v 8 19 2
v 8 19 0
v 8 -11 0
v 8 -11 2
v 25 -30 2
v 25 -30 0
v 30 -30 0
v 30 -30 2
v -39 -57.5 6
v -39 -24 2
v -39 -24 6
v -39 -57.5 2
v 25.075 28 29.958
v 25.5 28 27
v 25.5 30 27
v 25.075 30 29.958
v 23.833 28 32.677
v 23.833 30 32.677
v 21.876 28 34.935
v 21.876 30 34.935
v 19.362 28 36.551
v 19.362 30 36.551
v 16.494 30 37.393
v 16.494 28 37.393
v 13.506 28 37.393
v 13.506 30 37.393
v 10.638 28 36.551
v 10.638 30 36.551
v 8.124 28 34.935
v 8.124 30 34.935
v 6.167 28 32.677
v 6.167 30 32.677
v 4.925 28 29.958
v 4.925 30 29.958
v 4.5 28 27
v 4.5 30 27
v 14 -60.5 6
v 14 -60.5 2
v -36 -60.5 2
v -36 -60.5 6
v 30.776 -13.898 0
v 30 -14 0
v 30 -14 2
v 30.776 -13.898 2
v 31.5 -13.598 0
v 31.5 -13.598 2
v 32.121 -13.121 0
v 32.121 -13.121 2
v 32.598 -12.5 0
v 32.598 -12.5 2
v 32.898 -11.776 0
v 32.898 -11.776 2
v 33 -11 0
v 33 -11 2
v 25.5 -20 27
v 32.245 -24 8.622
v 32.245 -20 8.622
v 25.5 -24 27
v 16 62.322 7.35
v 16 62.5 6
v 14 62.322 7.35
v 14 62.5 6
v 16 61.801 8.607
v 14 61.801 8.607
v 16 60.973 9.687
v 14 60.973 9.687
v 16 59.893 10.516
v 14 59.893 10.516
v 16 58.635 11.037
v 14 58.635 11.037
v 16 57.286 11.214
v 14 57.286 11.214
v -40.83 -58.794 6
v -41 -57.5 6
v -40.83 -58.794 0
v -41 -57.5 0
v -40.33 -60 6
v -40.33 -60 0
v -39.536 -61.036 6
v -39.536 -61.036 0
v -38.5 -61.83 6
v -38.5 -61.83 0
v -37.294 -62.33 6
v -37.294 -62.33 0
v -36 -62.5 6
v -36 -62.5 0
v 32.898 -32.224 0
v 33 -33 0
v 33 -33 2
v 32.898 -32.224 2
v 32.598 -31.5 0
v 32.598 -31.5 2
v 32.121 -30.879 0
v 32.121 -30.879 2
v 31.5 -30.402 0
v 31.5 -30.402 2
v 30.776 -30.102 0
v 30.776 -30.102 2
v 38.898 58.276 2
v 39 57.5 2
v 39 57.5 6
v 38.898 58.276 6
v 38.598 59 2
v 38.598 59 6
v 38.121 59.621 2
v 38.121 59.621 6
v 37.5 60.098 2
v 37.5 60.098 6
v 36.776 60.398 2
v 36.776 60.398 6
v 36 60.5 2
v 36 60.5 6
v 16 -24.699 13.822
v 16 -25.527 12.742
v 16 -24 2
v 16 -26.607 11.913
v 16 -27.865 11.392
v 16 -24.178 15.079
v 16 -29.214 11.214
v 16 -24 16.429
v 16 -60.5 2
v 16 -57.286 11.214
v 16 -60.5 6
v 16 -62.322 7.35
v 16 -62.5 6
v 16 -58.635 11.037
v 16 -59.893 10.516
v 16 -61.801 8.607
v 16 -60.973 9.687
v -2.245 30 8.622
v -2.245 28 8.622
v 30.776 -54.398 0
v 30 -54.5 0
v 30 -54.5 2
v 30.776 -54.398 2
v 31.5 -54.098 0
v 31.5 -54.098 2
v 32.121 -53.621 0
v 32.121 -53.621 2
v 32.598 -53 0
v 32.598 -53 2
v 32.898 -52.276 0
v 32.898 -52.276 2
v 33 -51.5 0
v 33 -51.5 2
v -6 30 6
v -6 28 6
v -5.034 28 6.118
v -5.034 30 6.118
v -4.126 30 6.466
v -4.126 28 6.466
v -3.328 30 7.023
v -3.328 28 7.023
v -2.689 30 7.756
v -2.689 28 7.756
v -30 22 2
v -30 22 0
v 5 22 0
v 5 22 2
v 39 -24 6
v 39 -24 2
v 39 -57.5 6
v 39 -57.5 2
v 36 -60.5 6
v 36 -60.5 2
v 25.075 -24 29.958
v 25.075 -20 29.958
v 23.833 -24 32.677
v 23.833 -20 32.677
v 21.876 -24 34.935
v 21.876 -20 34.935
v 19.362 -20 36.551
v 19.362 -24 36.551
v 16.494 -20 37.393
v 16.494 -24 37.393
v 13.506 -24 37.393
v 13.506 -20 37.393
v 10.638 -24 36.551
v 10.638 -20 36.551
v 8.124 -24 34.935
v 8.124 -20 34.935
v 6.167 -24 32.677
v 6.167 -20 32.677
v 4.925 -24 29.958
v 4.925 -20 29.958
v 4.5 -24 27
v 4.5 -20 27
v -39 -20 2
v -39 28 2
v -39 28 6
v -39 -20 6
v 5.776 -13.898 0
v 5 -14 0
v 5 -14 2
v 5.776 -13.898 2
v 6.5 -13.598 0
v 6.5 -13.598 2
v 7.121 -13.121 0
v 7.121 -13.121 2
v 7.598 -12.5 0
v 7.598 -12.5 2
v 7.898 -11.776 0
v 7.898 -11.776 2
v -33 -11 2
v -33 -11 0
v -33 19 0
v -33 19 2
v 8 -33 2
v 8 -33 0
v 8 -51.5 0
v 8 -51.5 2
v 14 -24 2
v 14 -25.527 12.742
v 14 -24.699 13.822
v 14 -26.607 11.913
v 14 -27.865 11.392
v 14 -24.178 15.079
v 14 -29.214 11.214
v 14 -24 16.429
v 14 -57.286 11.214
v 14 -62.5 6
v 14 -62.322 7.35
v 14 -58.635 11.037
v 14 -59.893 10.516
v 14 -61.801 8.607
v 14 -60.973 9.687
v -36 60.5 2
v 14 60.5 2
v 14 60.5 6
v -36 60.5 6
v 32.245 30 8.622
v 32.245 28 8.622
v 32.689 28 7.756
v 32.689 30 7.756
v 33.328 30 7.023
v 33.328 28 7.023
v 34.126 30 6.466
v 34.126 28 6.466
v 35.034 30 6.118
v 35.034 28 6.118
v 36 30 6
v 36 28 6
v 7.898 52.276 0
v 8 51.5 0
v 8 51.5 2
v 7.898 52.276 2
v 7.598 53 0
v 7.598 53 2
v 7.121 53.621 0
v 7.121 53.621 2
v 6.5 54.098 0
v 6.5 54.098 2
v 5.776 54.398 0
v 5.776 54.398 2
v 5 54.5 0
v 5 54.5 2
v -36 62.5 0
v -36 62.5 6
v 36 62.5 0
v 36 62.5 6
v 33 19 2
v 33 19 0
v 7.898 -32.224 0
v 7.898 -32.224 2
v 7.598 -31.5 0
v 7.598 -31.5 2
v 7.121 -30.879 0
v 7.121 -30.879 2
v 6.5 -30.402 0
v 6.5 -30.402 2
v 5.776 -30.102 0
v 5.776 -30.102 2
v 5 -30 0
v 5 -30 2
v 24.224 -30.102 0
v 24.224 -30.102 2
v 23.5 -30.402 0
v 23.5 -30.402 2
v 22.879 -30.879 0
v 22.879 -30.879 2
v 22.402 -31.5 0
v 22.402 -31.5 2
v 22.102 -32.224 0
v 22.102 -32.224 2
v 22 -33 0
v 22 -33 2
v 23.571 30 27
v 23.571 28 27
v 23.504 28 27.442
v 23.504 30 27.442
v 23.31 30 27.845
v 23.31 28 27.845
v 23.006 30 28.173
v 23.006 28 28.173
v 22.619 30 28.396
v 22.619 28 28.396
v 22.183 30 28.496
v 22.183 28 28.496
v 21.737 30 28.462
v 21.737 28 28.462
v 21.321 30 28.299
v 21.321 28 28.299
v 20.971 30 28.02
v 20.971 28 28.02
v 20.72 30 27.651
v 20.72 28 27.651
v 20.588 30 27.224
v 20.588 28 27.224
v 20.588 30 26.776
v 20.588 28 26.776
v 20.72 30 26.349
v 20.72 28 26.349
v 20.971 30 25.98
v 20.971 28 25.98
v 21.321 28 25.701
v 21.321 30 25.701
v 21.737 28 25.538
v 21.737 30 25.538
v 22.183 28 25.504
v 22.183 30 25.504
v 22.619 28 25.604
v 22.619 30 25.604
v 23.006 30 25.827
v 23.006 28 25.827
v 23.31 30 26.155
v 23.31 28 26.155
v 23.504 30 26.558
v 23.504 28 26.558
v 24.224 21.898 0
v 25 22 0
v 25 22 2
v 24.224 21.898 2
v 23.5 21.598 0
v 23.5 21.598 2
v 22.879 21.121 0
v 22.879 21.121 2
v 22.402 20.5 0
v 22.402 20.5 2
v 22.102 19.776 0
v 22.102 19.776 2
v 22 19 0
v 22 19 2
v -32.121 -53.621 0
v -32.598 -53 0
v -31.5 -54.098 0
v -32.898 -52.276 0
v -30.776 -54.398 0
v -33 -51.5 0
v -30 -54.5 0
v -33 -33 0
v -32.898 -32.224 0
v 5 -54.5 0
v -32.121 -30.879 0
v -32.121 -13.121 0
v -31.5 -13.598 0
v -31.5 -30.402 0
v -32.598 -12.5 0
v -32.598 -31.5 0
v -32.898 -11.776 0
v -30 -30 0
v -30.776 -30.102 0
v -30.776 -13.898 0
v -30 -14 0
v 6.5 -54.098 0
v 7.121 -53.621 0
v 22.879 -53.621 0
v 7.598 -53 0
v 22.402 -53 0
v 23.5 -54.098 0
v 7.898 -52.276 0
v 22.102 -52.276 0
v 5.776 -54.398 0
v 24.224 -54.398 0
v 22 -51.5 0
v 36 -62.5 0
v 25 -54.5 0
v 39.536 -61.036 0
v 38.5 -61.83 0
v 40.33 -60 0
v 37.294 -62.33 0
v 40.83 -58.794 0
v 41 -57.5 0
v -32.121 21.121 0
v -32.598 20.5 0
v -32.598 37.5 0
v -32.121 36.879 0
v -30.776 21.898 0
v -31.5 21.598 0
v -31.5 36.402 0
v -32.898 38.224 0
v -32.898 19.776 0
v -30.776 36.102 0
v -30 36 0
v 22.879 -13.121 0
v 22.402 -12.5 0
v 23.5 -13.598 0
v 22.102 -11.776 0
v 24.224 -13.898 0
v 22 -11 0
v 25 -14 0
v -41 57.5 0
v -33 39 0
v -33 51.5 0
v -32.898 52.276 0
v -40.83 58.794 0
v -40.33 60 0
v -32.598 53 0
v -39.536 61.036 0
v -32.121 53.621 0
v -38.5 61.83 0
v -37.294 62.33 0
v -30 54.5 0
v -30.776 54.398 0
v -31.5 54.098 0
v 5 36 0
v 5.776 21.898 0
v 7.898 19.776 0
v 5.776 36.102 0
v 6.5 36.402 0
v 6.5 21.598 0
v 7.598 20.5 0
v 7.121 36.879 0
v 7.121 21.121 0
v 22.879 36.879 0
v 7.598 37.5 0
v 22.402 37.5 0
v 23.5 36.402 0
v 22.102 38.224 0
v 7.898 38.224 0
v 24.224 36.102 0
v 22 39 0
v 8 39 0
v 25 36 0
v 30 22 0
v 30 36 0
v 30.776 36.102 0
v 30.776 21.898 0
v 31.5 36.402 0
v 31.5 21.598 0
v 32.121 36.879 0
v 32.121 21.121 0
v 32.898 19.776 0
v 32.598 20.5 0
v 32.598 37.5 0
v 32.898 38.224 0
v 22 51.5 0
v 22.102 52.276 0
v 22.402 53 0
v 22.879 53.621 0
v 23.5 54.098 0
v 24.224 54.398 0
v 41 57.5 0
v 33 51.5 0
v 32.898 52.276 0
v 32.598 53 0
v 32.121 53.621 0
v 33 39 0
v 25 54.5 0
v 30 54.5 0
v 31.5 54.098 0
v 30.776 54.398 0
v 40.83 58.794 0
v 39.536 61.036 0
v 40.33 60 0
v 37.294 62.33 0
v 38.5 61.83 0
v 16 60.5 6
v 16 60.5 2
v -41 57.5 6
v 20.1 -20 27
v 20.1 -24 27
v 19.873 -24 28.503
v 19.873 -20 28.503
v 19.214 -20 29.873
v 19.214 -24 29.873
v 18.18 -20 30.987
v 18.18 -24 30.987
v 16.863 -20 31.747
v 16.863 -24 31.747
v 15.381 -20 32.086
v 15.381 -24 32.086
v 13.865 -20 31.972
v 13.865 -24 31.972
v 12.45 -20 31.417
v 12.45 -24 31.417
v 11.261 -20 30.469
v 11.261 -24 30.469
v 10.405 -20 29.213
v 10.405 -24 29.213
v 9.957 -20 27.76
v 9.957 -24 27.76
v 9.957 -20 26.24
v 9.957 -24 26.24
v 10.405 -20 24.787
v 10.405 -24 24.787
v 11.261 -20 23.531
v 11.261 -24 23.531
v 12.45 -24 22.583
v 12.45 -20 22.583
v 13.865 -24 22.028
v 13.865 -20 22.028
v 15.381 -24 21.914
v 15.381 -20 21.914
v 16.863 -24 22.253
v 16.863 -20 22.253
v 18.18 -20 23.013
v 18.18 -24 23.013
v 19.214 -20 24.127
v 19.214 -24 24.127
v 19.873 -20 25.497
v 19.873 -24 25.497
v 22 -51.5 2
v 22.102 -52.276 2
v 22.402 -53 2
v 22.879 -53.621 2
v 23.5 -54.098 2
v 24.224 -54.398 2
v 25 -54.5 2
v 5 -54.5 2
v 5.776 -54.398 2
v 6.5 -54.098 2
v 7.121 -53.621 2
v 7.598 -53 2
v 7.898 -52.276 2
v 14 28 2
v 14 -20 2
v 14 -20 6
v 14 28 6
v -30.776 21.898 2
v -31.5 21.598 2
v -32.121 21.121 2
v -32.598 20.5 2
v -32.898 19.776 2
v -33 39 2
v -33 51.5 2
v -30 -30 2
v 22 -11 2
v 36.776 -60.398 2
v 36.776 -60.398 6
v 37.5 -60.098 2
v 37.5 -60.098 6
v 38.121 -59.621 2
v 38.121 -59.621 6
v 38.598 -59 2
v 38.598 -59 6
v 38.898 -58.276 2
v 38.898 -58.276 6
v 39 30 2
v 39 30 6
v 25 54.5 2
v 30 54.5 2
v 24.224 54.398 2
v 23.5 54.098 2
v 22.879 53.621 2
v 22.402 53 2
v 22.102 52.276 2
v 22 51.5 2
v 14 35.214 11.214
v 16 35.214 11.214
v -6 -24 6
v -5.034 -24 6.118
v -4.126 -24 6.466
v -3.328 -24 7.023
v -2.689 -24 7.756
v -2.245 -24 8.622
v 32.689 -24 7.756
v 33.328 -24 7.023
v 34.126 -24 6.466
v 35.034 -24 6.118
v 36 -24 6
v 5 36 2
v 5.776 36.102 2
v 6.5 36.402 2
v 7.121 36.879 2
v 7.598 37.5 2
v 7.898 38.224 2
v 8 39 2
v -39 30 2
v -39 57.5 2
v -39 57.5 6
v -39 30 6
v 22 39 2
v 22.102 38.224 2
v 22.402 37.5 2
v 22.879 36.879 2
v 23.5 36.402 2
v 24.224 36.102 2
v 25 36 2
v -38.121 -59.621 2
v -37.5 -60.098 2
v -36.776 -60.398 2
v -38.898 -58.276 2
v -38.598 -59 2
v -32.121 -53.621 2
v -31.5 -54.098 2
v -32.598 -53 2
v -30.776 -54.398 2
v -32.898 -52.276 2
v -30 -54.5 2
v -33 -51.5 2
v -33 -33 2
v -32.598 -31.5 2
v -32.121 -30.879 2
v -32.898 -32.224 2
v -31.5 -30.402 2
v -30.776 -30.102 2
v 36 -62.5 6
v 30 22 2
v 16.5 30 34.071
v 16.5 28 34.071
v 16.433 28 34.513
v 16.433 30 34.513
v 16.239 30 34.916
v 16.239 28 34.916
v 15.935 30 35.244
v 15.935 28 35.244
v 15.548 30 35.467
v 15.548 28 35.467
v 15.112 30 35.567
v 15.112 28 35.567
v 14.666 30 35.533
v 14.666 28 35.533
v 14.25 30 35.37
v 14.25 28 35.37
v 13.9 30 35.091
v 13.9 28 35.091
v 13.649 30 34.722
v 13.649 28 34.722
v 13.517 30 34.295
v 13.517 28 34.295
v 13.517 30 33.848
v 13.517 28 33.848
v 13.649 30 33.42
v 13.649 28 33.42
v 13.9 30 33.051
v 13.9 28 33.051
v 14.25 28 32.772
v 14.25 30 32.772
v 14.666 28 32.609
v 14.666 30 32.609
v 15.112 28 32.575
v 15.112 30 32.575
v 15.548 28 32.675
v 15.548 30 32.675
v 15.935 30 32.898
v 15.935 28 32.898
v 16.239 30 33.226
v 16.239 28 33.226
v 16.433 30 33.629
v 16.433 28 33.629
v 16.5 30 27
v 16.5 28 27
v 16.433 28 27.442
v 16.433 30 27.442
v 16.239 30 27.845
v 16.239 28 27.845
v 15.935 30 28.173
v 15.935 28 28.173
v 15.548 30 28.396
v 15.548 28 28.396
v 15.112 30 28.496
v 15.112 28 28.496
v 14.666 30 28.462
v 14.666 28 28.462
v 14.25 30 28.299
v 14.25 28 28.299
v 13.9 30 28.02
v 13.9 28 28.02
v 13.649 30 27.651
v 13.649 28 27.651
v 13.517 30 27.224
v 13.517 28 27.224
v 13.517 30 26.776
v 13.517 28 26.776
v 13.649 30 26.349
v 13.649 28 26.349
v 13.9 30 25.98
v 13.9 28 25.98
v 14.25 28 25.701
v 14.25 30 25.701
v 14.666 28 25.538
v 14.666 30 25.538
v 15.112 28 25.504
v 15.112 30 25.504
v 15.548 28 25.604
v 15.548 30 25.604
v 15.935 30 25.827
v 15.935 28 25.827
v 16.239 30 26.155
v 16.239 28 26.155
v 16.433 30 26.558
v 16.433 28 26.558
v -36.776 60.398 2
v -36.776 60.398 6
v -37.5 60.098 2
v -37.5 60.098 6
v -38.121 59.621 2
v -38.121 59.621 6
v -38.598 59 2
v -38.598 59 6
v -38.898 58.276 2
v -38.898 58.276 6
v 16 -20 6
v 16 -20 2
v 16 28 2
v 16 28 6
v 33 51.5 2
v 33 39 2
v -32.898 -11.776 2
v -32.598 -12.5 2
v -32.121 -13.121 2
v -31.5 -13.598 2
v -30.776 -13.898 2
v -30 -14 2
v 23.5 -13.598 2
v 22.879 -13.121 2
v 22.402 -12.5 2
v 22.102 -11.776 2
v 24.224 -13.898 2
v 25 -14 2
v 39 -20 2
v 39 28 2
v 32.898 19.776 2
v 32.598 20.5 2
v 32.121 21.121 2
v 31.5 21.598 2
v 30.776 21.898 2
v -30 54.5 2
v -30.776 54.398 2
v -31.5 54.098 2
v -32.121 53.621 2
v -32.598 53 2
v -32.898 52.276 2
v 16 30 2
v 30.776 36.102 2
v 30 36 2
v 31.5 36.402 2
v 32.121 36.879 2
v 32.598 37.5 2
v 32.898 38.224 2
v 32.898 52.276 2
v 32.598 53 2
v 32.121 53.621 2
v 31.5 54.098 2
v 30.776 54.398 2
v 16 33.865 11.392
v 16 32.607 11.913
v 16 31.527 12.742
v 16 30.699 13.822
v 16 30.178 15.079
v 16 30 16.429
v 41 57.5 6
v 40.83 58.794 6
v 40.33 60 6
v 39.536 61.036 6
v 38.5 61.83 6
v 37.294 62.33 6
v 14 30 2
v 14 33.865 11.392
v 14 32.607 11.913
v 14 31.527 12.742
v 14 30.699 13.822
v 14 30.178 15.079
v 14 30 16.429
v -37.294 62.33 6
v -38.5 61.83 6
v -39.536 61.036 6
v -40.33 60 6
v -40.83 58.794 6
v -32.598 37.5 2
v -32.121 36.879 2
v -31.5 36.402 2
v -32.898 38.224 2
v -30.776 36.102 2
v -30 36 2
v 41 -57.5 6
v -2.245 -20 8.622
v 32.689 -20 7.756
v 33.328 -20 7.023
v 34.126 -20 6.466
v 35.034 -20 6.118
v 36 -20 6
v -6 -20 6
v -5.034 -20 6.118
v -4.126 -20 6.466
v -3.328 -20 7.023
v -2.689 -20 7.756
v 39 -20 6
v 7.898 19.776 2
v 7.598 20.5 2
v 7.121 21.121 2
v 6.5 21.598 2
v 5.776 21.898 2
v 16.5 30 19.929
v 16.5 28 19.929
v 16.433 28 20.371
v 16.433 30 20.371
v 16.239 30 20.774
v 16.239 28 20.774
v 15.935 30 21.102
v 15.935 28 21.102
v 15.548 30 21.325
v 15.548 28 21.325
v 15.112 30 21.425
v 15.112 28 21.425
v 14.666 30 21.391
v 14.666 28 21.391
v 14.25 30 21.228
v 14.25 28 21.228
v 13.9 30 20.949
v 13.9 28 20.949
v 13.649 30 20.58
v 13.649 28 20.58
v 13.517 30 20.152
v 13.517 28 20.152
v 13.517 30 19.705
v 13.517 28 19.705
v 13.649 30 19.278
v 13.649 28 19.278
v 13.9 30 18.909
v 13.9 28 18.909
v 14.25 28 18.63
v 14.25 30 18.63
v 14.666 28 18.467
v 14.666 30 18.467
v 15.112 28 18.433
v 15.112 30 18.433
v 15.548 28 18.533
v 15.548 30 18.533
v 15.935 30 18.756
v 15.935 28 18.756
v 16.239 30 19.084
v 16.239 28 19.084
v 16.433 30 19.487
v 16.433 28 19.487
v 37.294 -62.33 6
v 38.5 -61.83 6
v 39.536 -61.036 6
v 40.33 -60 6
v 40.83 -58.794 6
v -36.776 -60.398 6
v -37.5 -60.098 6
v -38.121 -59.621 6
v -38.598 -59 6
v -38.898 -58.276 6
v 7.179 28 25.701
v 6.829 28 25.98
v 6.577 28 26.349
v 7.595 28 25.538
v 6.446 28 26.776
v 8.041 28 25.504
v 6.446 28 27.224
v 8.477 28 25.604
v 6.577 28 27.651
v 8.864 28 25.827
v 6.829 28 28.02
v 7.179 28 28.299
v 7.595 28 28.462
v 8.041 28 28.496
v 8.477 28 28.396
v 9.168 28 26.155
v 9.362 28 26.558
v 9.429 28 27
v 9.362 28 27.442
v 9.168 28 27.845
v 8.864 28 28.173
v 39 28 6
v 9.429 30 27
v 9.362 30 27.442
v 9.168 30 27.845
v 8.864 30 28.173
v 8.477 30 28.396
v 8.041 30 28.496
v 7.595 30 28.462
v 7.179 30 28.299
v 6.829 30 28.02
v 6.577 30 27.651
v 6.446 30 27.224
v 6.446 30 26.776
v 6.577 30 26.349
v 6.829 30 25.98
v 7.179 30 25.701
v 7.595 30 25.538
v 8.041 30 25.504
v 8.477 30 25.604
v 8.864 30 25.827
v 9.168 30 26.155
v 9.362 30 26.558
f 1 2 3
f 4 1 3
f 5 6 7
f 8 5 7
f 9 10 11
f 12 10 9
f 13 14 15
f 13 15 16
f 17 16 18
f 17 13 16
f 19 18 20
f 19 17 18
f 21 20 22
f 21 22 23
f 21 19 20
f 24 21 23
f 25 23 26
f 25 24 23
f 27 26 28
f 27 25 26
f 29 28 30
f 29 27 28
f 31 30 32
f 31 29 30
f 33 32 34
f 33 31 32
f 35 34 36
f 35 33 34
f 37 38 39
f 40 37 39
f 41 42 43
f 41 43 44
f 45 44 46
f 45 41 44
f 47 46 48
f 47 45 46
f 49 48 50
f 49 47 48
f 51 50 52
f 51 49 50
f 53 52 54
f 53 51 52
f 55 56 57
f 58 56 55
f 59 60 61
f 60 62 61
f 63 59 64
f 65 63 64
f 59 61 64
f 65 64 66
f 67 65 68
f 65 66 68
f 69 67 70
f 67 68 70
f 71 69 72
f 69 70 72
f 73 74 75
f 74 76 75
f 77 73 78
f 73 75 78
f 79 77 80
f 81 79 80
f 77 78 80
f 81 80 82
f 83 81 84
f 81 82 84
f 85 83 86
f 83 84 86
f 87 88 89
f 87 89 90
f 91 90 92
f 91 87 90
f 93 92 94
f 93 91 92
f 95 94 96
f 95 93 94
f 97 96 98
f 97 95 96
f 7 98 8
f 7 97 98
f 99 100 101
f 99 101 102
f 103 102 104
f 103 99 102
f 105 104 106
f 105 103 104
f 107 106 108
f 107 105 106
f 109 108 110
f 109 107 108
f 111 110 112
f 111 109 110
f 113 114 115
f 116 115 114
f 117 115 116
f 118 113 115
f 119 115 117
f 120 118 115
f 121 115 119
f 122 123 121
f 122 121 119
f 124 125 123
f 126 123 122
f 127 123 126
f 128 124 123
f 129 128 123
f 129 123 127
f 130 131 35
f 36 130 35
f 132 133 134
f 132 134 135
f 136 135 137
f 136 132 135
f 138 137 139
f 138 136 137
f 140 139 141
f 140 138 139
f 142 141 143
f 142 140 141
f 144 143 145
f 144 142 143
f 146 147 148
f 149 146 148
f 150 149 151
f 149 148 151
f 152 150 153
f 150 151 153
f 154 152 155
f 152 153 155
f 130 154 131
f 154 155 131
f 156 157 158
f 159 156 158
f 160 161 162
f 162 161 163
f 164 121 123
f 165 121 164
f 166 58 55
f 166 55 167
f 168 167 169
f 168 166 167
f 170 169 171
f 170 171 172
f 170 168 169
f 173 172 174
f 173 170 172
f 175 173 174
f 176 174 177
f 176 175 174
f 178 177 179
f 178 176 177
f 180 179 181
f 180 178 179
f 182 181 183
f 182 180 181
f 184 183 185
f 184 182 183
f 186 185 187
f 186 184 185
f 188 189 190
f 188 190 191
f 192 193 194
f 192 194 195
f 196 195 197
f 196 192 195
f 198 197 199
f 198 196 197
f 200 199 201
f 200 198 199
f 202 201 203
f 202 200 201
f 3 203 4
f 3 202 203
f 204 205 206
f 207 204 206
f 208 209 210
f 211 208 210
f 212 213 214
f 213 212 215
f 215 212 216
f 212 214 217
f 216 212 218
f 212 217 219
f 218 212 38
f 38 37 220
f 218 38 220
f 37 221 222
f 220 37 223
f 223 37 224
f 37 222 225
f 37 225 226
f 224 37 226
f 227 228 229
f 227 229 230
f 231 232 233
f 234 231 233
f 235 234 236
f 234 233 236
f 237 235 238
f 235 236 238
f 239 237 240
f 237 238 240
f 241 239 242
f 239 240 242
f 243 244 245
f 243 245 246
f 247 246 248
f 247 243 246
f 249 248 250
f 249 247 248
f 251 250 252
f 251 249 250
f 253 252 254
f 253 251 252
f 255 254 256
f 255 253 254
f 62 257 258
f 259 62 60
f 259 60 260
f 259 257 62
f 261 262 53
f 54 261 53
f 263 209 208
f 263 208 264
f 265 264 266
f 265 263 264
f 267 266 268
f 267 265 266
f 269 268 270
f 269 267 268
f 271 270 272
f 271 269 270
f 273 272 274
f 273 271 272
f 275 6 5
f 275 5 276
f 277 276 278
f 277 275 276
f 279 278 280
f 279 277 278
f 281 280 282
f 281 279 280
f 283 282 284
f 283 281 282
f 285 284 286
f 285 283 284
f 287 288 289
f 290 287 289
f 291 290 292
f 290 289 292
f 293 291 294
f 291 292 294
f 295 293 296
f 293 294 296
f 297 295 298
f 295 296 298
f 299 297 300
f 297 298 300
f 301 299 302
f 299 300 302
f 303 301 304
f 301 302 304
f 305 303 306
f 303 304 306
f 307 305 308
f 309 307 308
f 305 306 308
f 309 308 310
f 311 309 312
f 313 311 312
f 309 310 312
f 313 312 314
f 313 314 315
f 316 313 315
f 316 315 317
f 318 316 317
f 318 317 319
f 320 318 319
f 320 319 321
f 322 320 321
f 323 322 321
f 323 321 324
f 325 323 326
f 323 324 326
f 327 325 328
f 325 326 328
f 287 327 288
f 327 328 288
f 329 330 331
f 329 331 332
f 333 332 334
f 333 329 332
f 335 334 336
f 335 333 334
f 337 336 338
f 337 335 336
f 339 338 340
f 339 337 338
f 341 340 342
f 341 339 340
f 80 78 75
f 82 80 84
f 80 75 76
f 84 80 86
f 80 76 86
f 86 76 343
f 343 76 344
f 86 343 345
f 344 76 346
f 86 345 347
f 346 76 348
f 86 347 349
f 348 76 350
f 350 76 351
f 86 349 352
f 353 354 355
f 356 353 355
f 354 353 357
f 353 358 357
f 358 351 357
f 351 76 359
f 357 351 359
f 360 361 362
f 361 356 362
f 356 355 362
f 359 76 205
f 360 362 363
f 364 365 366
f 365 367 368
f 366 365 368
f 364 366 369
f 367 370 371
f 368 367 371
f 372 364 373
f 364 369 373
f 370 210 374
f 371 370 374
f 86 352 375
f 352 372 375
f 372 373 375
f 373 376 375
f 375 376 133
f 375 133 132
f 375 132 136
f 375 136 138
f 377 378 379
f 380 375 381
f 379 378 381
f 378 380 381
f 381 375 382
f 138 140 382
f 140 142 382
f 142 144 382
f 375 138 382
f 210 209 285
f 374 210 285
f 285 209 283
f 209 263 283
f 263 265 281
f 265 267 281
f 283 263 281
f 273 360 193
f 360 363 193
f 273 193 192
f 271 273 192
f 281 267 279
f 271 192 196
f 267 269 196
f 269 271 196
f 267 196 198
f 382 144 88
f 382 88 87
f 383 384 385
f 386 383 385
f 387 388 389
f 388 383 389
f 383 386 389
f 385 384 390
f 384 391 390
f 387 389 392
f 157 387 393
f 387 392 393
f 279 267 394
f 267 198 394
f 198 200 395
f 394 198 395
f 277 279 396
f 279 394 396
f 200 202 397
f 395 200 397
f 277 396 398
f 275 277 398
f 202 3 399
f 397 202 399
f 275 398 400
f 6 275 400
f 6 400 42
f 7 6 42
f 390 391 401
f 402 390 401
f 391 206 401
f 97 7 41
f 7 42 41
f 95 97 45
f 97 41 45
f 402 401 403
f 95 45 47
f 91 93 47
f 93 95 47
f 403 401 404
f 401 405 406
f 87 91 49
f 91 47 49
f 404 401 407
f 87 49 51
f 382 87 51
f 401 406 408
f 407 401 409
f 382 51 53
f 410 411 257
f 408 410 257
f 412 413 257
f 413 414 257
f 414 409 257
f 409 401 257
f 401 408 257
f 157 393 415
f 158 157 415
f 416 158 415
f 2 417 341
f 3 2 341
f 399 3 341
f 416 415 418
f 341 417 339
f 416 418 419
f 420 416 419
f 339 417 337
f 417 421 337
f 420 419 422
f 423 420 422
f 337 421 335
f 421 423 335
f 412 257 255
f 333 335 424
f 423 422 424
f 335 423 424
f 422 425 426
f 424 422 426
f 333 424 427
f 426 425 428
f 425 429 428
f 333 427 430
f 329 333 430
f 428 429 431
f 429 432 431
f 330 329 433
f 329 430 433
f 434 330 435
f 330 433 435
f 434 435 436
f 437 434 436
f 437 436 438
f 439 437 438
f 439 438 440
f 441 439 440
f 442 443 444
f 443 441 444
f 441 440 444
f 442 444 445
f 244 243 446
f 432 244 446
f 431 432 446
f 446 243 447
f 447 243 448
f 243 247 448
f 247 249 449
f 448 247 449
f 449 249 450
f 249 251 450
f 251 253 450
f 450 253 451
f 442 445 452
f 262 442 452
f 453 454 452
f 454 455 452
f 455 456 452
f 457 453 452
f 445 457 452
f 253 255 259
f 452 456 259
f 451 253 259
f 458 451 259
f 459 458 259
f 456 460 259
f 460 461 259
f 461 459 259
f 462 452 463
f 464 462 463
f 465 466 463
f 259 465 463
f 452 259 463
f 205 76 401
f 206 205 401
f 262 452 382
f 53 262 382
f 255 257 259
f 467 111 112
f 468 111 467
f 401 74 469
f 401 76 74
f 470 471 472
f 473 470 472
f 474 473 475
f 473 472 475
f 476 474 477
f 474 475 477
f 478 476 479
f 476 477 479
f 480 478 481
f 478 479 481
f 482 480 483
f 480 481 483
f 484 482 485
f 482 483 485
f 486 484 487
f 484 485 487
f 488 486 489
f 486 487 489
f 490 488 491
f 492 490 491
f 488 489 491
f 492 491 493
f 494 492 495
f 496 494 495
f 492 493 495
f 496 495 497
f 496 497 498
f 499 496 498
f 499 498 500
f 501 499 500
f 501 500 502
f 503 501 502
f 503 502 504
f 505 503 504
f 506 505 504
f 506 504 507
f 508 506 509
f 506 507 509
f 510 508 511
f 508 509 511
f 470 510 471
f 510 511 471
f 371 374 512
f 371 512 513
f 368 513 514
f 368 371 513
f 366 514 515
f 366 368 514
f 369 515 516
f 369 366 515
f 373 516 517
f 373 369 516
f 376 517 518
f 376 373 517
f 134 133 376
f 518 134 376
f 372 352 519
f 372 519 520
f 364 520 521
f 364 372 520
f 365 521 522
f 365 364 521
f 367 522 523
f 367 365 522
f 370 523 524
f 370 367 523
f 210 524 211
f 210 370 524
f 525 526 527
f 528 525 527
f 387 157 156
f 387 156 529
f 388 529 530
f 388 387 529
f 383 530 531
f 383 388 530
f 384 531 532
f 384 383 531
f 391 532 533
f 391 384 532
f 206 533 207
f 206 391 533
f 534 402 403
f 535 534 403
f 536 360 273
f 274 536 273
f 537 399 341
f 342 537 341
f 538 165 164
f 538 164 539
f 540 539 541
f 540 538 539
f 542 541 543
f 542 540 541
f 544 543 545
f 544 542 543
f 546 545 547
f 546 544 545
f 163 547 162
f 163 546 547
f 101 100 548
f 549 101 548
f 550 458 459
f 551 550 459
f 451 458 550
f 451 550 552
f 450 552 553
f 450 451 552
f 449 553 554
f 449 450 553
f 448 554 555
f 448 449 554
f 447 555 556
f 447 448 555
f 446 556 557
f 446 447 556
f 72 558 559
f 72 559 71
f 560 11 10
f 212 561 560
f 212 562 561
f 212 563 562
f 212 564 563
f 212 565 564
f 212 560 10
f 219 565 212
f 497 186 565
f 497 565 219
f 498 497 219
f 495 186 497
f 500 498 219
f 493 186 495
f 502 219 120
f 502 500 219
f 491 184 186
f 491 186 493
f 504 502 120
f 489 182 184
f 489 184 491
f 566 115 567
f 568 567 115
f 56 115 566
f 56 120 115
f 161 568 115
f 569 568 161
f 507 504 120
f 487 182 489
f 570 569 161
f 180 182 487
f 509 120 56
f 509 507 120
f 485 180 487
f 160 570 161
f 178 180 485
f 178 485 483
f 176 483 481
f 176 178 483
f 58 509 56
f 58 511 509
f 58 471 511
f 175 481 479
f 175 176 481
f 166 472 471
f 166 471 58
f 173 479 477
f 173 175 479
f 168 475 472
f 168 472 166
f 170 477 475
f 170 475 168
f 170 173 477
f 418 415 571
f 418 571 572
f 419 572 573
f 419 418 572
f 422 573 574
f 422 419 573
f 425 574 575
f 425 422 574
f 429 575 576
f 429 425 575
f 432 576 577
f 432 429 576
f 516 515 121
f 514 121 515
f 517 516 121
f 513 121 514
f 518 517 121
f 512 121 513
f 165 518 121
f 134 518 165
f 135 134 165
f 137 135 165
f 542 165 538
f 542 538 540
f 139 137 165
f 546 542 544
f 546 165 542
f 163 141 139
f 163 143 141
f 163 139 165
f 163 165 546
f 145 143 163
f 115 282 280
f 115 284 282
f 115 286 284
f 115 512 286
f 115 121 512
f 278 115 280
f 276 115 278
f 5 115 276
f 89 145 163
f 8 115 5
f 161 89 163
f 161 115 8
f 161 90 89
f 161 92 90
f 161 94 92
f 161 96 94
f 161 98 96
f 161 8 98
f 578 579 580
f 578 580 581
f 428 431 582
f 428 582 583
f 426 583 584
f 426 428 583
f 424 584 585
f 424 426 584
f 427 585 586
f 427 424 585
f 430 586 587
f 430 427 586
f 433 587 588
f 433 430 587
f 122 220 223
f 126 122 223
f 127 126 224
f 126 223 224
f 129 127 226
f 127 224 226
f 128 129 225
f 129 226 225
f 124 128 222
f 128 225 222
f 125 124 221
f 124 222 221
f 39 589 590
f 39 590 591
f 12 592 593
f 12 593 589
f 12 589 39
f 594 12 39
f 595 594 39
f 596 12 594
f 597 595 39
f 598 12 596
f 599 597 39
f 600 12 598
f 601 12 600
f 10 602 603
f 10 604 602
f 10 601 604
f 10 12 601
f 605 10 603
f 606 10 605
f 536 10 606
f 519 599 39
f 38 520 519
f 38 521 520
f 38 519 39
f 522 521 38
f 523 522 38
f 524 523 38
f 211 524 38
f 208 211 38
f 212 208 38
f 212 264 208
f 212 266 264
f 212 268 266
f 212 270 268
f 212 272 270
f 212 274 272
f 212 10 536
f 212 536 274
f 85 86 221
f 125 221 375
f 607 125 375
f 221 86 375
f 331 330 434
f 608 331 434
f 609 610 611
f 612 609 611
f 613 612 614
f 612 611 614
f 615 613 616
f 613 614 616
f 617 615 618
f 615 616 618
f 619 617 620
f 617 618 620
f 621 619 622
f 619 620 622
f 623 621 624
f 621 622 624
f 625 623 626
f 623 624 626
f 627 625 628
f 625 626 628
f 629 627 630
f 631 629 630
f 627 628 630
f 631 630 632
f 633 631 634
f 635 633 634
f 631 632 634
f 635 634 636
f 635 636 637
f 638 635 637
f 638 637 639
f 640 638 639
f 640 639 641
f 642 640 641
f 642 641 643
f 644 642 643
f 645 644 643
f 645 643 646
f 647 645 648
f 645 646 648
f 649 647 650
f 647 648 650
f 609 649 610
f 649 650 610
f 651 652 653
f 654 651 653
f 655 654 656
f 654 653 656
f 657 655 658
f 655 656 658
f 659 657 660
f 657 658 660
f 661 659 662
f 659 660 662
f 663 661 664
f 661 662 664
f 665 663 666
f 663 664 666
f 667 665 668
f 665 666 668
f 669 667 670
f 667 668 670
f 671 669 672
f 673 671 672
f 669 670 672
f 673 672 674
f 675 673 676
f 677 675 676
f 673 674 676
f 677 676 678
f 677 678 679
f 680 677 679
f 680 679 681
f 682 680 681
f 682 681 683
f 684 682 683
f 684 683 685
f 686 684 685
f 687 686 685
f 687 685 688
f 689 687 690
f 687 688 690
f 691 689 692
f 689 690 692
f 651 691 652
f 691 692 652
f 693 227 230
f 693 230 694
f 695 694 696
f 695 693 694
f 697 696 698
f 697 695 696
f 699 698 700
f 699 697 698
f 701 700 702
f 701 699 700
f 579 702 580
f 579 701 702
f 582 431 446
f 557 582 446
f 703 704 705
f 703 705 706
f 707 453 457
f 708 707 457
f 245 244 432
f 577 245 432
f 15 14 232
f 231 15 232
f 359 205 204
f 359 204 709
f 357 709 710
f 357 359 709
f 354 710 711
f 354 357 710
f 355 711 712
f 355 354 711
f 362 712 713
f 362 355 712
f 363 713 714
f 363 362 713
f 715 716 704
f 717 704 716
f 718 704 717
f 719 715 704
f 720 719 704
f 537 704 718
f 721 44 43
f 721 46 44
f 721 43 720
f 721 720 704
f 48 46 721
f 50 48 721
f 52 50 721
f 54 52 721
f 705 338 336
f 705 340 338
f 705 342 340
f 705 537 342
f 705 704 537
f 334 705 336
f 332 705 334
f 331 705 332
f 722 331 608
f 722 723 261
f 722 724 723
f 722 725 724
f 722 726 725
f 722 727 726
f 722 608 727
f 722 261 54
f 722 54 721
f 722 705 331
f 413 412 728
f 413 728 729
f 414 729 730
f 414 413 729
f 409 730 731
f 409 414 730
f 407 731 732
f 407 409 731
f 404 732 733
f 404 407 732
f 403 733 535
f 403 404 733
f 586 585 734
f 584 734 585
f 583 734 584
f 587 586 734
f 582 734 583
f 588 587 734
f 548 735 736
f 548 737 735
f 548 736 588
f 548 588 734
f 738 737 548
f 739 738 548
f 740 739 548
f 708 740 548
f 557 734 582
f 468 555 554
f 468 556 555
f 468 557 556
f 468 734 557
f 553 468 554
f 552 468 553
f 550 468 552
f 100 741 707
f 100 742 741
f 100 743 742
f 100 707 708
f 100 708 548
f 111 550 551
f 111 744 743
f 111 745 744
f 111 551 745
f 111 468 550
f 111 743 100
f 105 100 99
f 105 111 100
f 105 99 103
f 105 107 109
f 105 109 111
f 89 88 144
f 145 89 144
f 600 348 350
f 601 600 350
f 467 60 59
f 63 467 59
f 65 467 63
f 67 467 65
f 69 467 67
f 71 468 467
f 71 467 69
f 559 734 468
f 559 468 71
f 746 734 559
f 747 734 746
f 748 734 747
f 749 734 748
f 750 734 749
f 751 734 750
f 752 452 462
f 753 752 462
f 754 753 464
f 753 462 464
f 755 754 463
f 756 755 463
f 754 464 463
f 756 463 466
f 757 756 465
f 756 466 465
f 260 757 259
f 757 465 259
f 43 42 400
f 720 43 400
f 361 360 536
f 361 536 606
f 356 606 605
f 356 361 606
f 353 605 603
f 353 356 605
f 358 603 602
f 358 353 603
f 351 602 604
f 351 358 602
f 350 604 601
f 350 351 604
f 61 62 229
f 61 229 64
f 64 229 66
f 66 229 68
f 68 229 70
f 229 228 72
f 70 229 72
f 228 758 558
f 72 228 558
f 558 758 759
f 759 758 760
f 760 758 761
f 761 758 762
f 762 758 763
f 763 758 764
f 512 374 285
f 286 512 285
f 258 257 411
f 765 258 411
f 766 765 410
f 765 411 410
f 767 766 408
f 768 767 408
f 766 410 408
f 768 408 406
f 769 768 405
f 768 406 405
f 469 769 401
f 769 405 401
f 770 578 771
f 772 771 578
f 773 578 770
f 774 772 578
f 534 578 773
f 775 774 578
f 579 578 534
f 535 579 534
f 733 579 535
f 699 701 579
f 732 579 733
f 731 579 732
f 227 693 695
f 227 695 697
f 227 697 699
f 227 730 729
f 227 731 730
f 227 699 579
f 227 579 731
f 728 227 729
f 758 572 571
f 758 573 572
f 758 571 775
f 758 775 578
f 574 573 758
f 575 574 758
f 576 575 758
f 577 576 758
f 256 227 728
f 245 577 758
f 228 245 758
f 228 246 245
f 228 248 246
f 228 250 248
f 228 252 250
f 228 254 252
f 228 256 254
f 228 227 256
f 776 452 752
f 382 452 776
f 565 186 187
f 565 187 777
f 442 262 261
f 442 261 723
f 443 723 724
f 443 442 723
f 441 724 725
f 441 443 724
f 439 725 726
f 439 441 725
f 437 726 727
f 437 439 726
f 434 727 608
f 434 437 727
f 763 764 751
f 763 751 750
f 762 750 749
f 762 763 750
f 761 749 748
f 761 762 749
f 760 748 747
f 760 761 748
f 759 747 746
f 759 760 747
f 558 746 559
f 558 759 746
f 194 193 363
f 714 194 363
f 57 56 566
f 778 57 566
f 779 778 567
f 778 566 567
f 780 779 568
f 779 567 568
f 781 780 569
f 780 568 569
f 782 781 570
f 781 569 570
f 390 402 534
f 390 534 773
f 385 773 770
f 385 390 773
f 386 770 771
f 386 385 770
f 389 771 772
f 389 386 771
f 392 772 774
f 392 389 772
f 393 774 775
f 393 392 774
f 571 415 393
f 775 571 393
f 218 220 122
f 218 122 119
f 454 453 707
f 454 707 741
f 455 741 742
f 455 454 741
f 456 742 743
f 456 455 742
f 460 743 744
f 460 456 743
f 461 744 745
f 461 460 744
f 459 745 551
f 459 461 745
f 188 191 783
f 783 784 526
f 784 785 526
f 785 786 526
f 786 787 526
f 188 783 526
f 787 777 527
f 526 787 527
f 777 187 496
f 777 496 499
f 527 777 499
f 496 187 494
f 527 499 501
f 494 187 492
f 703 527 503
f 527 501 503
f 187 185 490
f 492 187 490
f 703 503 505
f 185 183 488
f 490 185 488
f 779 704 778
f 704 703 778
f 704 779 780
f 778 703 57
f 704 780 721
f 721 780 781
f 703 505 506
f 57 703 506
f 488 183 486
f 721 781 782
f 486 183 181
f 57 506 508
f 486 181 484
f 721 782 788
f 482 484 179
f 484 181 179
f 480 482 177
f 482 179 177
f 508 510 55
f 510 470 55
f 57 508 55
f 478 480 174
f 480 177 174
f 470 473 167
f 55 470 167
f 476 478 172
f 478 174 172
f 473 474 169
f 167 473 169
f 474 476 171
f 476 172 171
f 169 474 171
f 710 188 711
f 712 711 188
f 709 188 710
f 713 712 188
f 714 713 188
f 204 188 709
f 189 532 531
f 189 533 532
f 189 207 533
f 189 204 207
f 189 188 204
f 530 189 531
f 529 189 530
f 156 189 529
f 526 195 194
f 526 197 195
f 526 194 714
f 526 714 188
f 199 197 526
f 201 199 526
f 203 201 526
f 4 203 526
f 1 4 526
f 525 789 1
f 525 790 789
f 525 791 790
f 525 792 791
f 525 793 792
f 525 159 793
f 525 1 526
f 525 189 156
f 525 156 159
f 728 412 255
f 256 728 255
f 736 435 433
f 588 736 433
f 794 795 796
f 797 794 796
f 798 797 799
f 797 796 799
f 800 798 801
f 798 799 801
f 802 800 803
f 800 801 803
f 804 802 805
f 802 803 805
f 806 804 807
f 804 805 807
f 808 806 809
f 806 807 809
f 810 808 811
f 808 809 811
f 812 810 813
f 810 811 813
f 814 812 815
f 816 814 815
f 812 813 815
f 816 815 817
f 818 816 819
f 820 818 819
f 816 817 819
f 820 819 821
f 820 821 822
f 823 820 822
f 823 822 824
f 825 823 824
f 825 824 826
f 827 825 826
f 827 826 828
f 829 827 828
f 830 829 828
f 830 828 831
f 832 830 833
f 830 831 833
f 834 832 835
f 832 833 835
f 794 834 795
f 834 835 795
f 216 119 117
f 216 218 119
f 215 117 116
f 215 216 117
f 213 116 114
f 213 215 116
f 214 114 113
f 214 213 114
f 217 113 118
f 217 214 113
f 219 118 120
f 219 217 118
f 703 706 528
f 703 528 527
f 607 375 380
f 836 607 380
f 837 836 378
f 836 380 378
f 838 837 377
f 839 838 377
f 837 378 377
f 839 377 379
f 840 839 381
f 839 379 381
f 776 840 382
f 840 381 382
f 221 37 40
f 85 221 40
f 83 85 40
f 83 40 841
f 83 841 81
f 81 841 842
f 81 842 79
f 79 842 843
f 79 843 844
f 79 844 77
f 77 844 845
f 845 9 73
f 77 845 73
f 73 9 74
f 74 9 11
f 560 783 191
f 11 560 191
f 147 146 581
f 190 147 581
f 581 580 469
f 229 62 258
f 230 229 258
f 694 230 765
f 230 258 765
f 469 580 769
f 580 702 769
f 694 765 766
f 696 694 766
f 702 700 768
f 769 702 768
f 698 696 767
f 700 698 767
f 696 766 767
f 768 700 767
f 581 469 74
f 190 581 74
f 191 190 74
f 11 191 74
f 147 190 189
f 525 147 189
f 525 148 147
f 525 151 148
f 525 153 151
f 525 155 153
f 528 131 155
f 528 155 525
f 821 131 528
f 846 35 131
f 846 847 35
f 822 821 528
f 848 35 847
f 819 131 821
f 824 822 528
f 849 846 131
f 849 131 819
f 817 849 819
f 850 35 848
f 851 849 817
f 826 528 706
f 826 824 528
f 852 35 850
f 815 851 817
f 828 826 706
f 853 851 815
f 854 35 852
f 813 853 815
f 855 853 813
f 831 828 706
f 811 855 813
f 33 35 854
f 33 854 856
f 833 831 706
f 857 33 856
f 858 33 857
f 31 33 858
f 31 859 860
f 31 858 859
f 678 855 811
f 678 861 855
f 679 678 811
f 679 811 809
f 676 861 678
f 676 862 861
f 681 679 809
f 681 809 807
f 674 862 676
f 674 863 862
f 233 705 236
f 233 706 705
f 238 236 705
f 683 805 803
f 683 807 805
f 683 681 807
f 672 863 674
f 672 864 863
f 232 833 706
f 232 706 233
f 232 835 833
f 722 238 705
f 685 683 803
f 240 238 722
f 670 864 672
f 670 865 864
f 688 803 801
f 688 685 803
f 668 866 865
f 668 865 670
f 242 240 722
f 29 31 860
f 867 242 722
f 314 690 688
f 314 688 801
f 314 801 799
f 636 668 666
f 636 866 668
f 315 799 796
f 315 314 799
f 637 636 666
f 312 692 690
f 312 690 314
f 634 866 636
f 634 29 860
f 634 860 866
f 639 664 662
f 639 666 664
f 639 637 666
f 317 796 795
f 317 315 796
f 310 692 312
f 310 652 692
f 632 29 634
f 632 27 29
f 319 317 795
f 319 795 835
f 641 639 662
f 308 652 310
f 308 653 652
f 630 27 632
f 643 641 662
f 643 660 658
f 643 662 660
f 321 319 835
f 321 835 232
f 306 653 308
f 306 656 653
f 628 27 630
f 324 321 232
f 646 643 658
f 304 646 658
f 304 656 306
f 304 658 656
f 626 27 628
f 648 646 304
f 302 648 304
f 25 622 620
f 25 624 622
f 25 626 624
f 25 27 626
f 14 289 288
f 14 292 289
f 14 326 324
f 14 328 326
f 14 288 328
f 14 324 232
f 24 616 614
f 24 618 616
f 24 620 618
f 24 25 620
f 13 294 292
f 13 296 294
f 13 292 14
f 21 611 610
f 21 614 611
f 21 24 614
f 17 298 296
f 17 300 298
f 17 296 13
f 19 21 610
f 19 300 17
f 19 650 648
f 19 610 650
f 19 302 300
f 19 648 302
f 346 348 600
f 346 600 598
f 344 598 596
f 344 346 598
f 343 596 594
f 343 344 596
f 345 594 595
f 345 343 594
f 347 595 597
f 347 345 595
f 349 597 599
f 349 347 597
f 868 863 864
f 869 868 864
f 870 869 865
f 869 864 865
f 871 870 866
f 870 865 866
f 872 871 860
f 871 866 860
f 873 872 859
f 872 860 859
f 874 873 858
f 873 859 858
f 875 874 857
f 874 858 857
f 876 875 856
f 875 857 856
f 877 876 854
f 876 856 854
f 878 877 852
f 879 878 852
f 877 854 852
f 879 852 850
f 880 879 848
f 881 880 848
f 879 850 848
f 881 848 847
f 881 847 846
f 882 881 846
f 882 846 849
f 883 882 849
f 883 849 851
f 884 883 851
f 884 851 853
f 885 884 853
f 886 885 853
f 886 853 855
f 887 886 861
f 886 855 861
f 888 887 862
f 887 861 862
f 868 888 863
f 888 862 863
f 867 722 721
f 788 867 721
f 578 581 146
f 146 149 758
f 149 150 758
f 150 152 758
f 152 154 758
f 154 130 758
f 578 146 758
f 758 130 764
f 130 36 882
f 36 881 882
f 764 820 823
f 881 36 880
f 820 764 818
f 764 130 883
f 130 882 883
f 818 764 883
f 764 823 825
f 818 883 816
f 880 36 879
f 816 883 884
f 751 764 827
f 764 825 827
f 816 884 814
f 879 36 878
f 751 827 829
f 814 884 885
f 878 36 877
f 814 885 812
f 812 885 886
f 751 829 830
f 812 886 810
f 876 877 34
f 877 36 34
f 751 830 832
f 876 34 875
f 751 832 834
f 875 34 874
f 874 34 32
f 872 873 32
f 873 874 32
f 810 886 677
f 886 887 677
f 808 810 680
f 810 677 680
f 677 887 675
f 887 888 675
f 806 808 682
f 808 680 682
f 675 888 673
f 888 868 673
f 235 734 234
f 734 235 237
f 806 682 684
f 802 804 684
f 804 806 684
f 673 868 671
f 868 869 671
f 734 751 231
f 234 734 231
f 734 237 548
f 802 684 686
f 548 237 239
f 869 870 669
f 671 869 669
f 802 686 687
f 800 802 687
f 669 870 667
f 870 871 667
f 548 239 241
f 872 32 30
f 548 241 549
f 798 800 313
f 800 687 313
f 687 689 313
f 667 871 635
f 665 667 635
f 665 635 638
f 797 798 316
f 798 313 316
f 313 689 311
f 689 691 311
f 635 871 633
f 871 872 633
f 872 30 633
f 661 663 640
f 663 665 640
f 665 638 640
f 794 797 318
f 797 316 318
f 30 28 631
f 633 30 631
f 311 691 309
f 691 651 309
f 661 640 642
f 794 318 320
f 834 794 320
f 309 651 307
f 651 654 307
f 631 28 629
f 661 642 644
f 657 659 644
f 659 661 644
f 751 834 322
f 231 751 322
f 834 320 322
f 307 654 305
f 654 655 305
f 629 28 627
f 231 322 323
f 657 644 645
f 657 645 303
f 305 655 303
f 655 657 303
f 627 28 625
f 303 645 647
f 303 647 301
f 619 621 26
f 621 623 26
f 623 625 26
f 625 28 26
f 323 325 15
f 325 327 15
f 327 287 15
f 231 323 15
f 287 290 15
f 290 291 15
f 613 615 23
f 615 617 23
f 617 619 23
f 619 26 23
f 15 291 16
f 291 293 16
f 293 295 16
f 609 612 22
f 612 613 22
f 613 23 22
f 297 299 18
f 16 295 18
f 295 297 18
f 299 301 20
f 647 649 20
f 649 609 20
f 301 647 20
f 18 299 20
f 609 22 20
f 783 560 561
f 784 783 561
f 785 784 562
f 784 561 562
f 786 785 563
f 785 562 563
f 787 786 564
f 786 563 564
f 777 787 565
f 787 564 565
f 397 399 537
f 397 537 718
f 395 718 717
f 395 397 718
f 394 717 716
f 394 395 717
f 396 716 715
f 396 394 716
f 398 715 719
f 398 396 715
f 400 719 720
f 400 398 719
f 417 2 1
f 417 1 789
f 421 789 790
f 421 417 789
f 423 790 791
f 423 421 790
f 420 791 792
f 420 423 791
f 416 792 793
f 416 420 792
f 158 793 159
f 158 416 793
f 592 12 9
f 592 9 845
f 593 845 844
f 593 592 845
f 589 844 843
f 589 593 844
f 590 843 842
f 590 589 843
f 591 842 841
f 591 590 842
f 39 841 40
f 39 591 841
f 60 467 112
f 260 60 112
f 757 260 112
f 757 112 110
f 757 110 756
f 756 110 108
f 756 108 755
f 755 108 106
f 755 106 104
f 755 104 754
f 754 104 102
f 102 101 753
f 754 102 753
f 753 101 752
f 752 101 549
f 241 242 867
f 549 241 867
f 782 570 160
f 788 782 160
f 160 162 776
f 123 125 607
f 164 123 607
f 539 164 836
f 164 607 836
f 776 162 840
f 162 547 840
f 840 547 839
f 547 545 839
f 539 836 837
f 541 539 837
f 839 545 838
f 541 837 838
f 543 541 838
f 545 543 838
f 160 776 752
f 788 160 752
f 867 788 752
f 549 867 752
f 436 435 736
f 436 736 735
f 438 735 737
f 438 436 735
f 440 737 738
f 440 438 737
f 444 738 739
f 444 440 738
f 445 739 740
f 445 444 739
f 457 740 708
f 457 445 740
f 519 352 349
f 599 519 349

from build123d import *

# Parameters (mm, degrees)
PAD_DEPTH    = 2
SKETCH001_R  = 5.1
PAD001_DEPTH = 4
SKETCH002_R  = 1.5
PAD002_DEPTH = 2
SKETCH003_W  = 4
SKETCH003_H  = 48
PAD003_DEPTH = 1
PAD004_DEPTH = 4


with BuildPart() as part:
    # Sketch → Pad (new body)
    with BuildSketch(Plane.XY):
        with BuildLine():
            ThreePointArc((-36, 62.5), (-39.535534, 61.035534), (-41, 57.5))
            Line((-41, -57.5), (-41, 57.5))
            ThreePointArc((-41, -57.5), (-39.535534, -61.035534), (-36, -62.5))
            Line((36, -62.5), (-36, -62.5))
            ThreePointArc((36, -62.5), (39.535534, -61.035534), (41, -57.5))
            Line((41, 57.5), (41, -57.5))
            ThreePointArc((41, 57.5), (39.535534, 61.035534), (36, 62.5))
            Line((-36, 62.5), (36, 62.5))
        make_face()
        with BuildLine():
            ThreePointArc((-30, 54.5), (-32.12132, 53.62132), (-33, 51.5))
            Line((-33, 39), (-33, 51.5))
            ThreePointArc((-33, 39), (-32.12132, 36.87868), (-30, 36))
            Line((5, 36), (-30, 36))
            ThreePointArc((5, 36), (7.12132, 36.87868), (8, 39))
            Line((8, 51.5), (8, 39))
            ThreePointArc((8, 51.5), (7.12132, 53.62132), (5, 54.5))
            Line((-30, 54.5), (5, 54.5))
        make_face(mode=Mode.SUBTRACT)
        with BuildLine():
            ThreePointArc((25, 54.5), (22.87868, 53.62132), (22, 51.5))
            Line((22, 39), (22, 51.5))
            ThreePointArc((22, 39), (22.87868, 36.87868), (25, 36))
            Line((30, 36), (25, 36))
            ThreePointArc((30, 36), (32.12132, 36.87868), (33, 39))
            Line((33, 51.5), (33, 39))
            ThreePointArc((33, 51.5), (32.12132, 53.62132), (30, 54.5))
            Line((25, 54.5), (30, 54.5))
        make_face(mode=Mode.SUBTRACT)
        with BuildLine():
            ThreePointArc((-30, 22), (-32.12132, 21.12132), (-33, 19))
            Line((-33, -11), (-33, 19))
            ThreePointArc((-33, -11), (-32.12132, -13.12132), (-30, -14))
            Line((5, -14), (-30, -14))
            ThreePointArc((5, -14), (7.12132, -13.12132), (8, -11))
            Line((8, 19), (8, -11))
            ThreePointArc((8, 19), (7.12132, 21.12132), (5, 22))
            Line((-30, 22), (5, 22))
        make_face(mode=Mode.SUBTRACT)
        with BuildLine():
            ThreePointArc((25, 22), (22.87868, 21.12132), (22, 19))
            Line((22, -11), (22, 19))
            ThreePointArc((22, -11), (22.87868, -13.12132), (25, -14))
            Line((30, -14), (25, -14))
            ThreePointArc((30, -14), (32.12132, -13.12132), (33, -11))
            Line((33, 19), (33, -11))
            ThreePointArc((33, 19), (32.12132, 21.12132), (30, 22))
            Line((25, 22), (30, 22))
        make_face(mode=Mode.SUBTRACT)
        with BuildLine():
            ThreePointArc((-30, -30), (-32.12132, -30.87868), (-33, -33))
            Line((-33, -51.5), (-33, -33))
            ThreePointArc((-33, -51.5), (-32.12132, -53.62132), (-30, -54.5))
            Line((5, -54.5), (-30, -54.5))
            ThreePointArc((5, -54.5), (7.12132, -53.62132), (8, -51.5))
            Line((8, -33), (8, -51.5))
            ThreePointArc((8, -33), (7.12132, -30.87868), (5, -30))
            Line((-30, -30), (5, -30))
        make_face(mode=Mode.SUBTRACT)
        with BuildLine():
            ThreePointArc((25, -30), (22.87868, -30.87868), (22, -33))
            Line((22, -51.5), (22, -33))
            ThreePointArc((22, -51.5), (22.87868, -53.62132), (25, -54.5))
            Line((30, -54.5), (25, -54.5))
            ThreePointArc((30, -54.5), (32.12132, -53.62132), (33, -51.5))
            Line((33, -33), (33, -51.5))
            ThreePointArc((33, -33), (32.12132, -30.87868), (30, -30))
            Line((25, -30), (30, -30))
        make_face(mode=Mode.SUBTRACT)
    extrude(amount=PAD_DEPTH)

    # Sketch001 (on DatumPlane) → Pad001 (join)
    with BuildSketch(Plane.XZ.offset(24)):
        with BuildLine():
            Line((39, 2), (39, 6))
            Line((39, 6), (36, 6))
            ThreePointArc((32.244908, 8.621855), (33.710085, 6.720322), (36, 6))
            Line((32.244908, 8.621855), (25.5, 27))
            ThreePointArc((25.5, 27), (15, 37.5), (4.5, 27))
            Line((4.5, 27), (-2.244908, 8.621855))
            ThreePointArc((-6, 6), (-3.710085, 6.720322), (-2.244908, 8.621855))
            Line((-6, 6), (-39, 6))
            Line((-39, 6), (-39, 2))
            Line((-39, 2), (39, 2))
        make_face()
        with Locations((15, 27)):
            Circle(SKETCH001_R, mode=Mode.SUBTRACT)
    extrude(amount=-PAD001_DEPTH)

    # Sketch002 (on DatumPlane) → Pad002 (join)
    with BuildSketch(Plane.XZ.offset(-28)):
        with BuildLine():
            Line((-39, 2), (39, 2))
            Line((39, 2), (39, 6))
            Line((36, 6), (39, 6))
            ThreePointArc((32.244908, 8.621855), (33.710085, 6.720322), (36, 6))
            Line((25.5, 27), (32.244908, 8.621855))
            ThreePointArc((25.5, 27), (15, 37.5), (4.5, 27))
            Line((-2.244908, 8.621855), (4.5, 27))
            ThreePointArc((-6, 6), (-3.710085, 6.720322), (-2.244908, 8.621855))
            Line((-39, 6), (-6, 6))
            Line((-39, 2), (-39, 6))
        make_face()
        with Locations((7.928932, 27)):
            Circle(SKETCH002_R, mode=Mode.SUBTRACT)
        with Locations((15, 34.071068)):
            Circle(SKETCH002_R, mode=Mode.SUBTRACT)
        with Locations((15, 27)):
            Circle(SKETCH002_R, mode=Mode.SUBTRACT)
        with Locations((22.071068, 27)):
            Circle(SKETCH002_R, mode=Mode.SUBTRACT)
        with Locations((15, 19.928932)):
            Circle(SKETCH002_R, mode=Mode.SUBTRACT)
    extrude(amount=-PAD002_DEPTH)

    # Sketch003 (on DatumPlane) → Pad003 (join, symmetric)
    with BuildSketch(Plane(origin=(15, -24, 26), x_dir=(0, 0, 1), z_dir=(1, 0, 0))):
        with BuildLine():
            Line((-24, -54), (-24, -86.5))
            Line((-24, -86.5), (-20, -86.5))
            ThreePointArc((-20, -86.5), (-16.312816, -84.972718), (-14.785534, -81.285534))
            Line((-14.785534, -59.214466), (-14.785534, -81.285534))
            ThreePointArc((-9.571068, -54), (-13.258252, -55.527282), (-14.785534, -59.214466))
            Line((-24, -54), (-9.571068, -54))
        make_face()
        with BuildLine():
            Line((-24, 38.5), (-24, 0))
            Line((-24, 0), (-9.571068, 0))
            ThreePointArc((-14.785534, 5.214466), (-13.258252, 1.527282), (-9.571068, 0))
            Line((-14.785534, 33.285534), (-14.785534, 5.214466))
            ThreePointArc((-14.785534, 33.285534), (-16.312816, 36.972718), (-20, 38.5))
            Line((-24, 38.5), (-20, 38.5))
        make_face()
        with Locations((-22, -28)):
            Rectangle(SKETCH003_W, SKETCH003_H)
    extrude(amount=PAD003_DEPTH, both=True)

    # Sketch004 (on Face8 of Pad003) → Pad004 (join)
    with BuildSketch(Plane.XY.offset(2)):
        with BuildLine():
            Line((-41, -57.5), (-41, 57.5))
            ThreePointArc((-36, 62.5), (-39.535534, 61.035534), (-41, 57.5))
            Line((-36, 62.5), (14, 62.5))
            Line((14, 60.5), (14, 62.5))
            Line((14, 60.5), (-36, 60.5))
            ThreePointArc((-36, 60.5), (-38.12132, 59.62132), (-39, 57.5))
            Line((-39, 57.5), (-39, -57.5))
            ThreePointArc((-39, -57.5), (-38.12132, -59.62132), (-36, -60.5))
            Line((14, -60.5), (-36, -60.5))
            Line((14, -62.5), (14, -60.5))
            Line((-36, -62.5), (14, -62.5))
            ThreePointArc((-41, -57.5), (-39.535534, -61.035534), (-36, -62.5))
        make_face()
        with BuildLine():
            Line((16, 62.5), (36, 62.5))
            ThreePointArc((41, 57.5), (39.535534, 61.035534), (36, 62.5))
            Line((41, -57.5), (41, 57.5))
            ThreePointArc((36, -62.5), (39.535534, -61.035534), (41, -57.5))
            Line((16, -62.5), (36, -62.5))
            Line((16, -60.5), (16, -62.5))
            Line((16, -60.5), (36, -60.5))
            ThreePointArc((36, -60.5), (38.12132, -59.62132), (39, -57.5))
            Line((39, 57.5), (39, -57.5))
            ThreePointArc((39, 57.5), (38.12132, 59.62132), (36, 60.5))
            Line((36, 60.5), (16, 60.5))
            Line((16, 60.5), (16, 62.5))
        make_face()
    extrude(amount=PAD004_DEPTH)


solid = part.part
